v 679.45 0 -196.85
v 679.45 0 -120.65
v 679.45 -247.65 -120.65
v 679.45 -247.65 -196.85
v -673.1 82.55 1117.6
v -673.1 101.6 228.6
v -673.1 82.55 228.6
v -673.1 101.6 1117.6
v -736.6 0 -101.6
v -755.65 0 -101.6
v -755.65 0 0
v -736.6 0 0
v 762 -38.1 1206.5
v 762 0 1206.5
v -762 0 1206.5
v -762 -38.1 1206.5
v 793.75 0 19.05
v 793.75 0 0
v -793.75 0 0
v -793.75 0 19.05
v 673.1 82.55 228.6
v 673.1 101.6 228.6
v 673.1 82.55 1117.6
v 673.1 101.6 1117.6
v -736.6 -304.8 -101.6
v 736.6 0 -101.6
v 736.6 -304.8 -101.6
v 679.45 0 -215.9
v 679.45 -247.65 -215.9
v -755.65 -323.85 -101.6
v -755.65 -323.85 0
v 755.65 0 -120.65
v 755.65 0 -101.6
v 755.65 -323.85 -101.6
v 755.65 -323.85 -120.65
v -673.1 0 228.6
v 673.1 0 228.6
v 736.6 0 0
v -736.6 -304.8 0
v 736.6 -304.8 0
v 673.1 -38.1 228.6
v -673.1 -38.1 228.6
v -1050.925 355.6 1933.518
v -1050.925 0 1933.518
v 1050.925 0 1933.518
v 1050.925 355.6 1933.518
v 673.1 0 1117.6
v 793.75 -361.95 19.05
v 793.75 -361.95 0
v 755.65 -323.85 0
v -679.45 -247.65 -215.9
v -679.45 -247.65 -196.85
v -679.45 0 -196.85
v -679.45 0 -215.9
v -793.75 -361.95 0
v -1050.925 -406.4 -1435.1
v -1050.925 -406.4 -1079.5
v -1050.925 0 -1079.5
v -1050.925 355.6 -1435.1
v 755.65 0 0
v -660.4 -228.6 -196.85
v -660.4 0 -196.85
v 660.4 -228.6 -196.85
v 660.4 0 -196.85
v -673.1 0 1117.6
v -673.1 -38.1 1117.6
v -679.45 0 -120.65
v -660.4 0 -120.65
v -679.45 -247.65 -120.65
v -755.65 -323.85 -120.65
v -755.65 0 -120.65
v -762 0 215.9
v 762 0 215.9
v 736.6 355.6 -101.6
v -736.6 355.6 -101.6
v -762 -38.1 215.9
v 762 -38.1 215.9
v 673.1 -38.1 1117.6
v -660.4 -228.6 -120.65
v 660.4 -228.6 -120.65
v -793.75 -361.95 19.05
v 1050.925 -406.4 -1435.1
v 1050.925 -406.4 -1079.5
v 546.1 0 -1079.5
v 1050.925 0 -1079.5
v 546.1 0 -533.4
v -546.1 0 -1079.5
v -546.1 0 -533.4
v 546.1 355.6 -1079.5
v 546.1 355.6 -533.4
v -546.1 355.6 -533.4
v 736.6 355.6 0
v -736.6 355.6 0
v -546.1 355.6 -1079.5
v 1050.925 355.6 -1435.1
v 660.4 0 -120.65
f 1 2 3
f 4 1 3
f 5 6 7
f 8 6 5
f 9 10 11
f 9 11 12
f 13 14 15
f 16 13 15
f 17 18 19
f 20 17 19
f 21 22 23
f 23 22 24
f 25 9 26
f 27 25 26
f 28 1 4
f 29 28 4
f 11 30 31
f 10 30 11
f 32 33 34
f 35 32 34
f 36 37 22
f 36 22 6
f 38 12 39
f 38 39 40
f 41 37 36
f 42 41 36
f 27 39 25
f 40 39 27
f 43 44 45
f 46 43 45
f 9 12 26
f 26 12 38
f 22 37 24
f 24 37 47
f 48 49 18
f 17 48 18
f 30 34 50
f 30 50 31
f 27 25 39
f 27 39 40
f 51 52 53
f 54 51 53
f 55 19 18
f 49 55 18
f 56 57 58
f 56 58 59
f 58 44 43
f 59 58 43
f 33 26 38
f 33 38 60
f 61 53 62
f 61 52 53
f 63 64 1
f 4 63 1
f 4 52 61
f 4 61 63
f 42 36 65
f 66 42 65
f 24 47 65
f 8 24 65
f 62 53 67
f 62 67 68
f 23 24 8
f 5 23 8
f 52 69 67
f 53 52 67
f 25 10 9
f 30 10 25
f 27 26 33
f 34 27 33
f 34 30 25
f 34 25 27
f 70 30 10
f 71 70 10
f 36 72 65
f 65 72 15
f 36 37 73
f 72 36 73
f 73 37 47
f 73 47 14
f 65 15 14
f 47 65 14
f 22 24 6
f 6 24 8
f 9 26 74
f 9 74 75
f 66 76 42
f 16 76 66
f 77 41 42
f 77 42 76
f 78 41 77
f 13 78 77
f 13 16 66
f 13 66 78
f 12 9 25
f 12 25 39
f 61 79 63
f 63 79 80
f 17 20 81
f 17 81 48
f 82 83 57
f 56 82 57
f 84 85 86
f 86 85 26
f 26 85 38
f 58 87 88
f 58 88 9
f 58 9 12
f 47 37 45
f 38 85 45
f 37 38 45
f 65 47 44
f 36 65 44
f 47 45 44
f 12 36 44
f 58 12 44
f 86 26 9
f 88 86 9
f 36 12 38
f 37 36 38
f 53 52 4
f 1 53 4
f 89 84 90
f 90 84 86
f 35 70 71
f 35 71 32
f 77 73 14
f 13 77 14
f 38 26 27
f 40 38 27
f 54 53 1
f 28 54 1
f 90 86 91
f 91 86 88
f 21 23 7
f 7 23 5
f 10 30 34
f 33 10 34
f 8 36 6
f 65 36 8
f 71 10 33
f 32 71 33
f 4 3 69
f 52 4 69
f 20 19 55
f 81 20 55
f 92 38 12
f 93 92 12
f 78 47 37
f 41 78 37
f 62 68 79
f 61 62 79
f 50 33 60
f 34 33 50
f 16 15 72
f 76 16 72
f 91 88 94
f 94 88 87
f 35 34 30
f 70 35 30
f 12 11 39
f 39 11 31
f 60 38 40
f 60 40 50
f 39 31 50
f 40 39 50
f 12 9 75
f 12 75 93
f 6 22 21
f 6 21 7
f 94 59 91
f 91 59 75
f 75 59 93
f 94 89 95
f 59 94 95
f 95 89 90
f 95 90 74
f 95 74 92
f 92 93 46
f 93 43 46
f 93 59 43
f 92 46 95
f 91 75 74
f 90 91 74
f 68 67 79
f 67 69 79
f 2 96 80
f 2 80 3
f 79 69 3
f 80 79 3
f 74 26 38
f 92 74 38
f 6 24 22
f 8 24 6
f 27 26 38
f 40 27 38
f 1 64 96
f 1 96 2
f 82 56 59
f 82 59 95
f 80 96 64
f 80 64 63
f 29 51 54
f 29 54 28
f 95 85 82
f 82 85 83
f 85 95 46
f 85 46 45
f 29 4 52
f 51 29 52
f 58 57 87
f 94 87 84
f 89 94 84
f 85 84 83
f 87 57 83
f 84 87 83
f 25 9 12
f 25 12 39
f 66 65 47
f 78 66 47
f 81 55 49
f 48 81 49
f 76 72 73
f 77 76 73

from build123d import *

# Parameters (mm, degrees)
F0_W      = 1473.2
F0_H      = 101.6
F1_DEPTH  = 304.8
F2_W      = 19.05
F2_H      = 304.8
F3_DEPTH  = 101.6
F4_W      = 1473.2
F4_H      = 304.8
F5_DEPTH  = 19.05
F6_W      = 1473.2
F6_H      = 304.8
F7_DEPTH  = 19.05
F8_W      = 19.05
F8_H      = 228.6
F9_DEPTH  = 76.2
F10_W     = 1320.8
F10_H     = 228.6
F11_DEPTH = 19.05
F12_W     = 1473.2
F12_H     = 101.6
F12_W_2   = 1346.2
F12_H_2   = 889
F13_DEPTH = 355.6
F14_DEPTH = 101.6
F15_W     = 504.825
F15_H     = 355.6
F16_DEPTH = 355.6
F18_DEPTH = 127
F20_DEPTH = 1468.6634540558
F22_DEPTH = 38.1
F23_DEPTH = 19.05


with BuildPart() as f1:
    # F0 (on Front) → F1 (new body)
    with BuildSketch(Plane.XZ):
        with Locations((0, -50.8)):
            Rectangle(F0_W, F0_H)
    extrude(amount=F1_DEPTH)


with BuildPart() as f3:
    # F2 (on face) → F3 (new body, through all)
    with BuildSketch(Plane(origin=(0, 0, -101.6), x_dir=(1, 0, 0), z_dir=(0, 0, -1))):
        Polygon((755.65, 323.85), (-755.65, 323.85), (-755.65, 304.8), (-736.6, 304.8), (736.6, 304.8), (755.65, 304.8), align=None)
        with Locations((-746.125, 152.4)):
            Rectangle(F2_W, F2_H)
        with Locations((746.125, 152.4)):
            Rectangle(F2_W, F2_H)
    extrude(amount=-F3_DEPTH)


with BuildPart() as f5:
    # F4 (on face) → F5 (new body)
    with BuildSketch(Plane(origin=(0, 0, -101.6), x_dir=(1, 0, 0), z_dir=(0, 0, -1))):
        Polygon((755.65, 323.85), (-755.65, 323.85), (-755.65, 0), (-736.6, 0), (-736.6, 304.8), (736.6, 304.8), (736.6, 0), (755.65, 0), align=None)
        with Locations((0, 152.4)):
            Rectangle(F4_W, F4_H)
    extrude(amount=F5_DEPTH)


with BuildPart() as f7:
    # F6 (on face) → F7 (new body)
    with BuildSketch(Plane.XY):
        with Locations((0, -152.4)):
            Rectangle(F6_W, F6_H)
        Polygon((-736.6, 0), (-755.65, 0), (-793.75, 0), (-793.75, -361.95), (793.75, -361.95), (793.75, 0), (755.65, 0), (736.6, 0), (736.6, -304.8), (-736.6, -304.8), align=None)
    extrude(amount=F7_DEPTH)


with BuildPart() as f9:
    # F8 (on face) → F9 (new body)
    with BuildSketch(Plane(origin=(0, 0, -120.65), x_dir=(1, 0, 0), z_dir=(0, 0, -1))):
        with Locations((-669.925, 114.3)):
            Rectangle(F8_W, F8_H)
        Polygon((-679.45, 247.65), (-679.45, 228.6), (-660.4, 228.6), (660.4, 228.6), (679.45, 228.6), (679.45, 247.65), align=None)
        with Locations((669.925, 114.3)):
            Rectangle(F8_W, F8_H)
    extrude(amount=F9_DEPTH)


with BuildPart() as f11:
    # F10 (on face) → F11 (new body)
    with BuildSketch(Plane(origin=(0, 0, -196.85), x_dir=(1, 0, 0), z_dir=(0, 0, -1))):
        Polygon((679.45, 0), (679.45, 247.65), (-679.45, 247.65), (-679.45, 0), (-660.4, 0), (-660.4, 228.6), (660.4, 228.6), (660.4, 0), align=None)
        with Locations((0, 114.3)):
            Rectangle(F10_W, F10_H)
    extrude(amount=F11_DEPTH)


with BuildPart() as f13:
    # F12 (on face) → F13 (new body)
    with BuildSketch(Plane(origin=(0, 0, 0), x_dir=(-1, 0, 0), z_dir=(0, 1, 0))):
        Polygon((-1050.925, 1117.6), (-1050.925, -1079.5), (-546.1, -1079.5), (-546.1, -533.4), (546.1, -533.4), (546.1, -1079.5), (1050.925, -1079.5), (1050.925, 1117.6), (1050.925, 1933.5181713104), (-1050.925, 1933.5181713104), align=None)
        with Locations((0, -50.8)):
            Rectangle(F12_W, F12_H, mode=Mode.SUBTRACT)
        with Locations((0, 673.1)):
            Rectangle(F12_W_2, F12_H_2, mode=Mode.SUBTRACT)
        with Locations((0, 673.1)):
            Rectangle(F12_W_2, F12_H_2)
    extrude(amount=F13_DEPTH)

    # F12 (on face) → F14 (cut)
    with BuildSketch(Plane(origin=(0, 0, 0), x_dir=(-1, 0, 0), z_dir=(0, 1, 0))):
        with Locations((0, 673.1)):
            Rectangle(F12_W_2, F12_H_2)
    extrude(amount=F14_DEPTH, mode=Mode.SUBTRACT)

    # F15 (on face) → F16 (join)
    with BuildSketch(Plane(origin=(0, 0, -1079.5), x_dir=(1, 0, 0), z_dir=(0, 0, -1))):
        Polygon((-546.1, 0), (-546.1, -355.6), (1050.925, -355.6), (1050.925, 406.4), (-1050.925, 406.4), (-1050.925, 0), align=None)
        with Locations((-798.5125, -177.8)):
            Rectangle(F15_W, F15_H)
    extrude(amount=F16_DEPTH)


with BuildPart() as f18:
    # F17 (on face) → F18 (new body)
    with BuildSketch(Plane.XZ):
        Polygon((476.25, -215.9), (400.05, -215.9), (438.15, -444.5), (476.25, -444.5), align=None)
        Polygon((552.45, -215.9), (476.25, -215.9), (476.25, -444.5), (514.35, -444.5), align=None)
    extrude(amount=F18_DEPTH)


with BuildPart() as f18b:
    # F17 (on face) → F18, piece 2 (new body)
    with BuildSketch(Plane.XZ):
        Polygon((-400.05, -215.9), (-476.25, -215.9), (-476.25, -444.5), (-438.15, -444.5), align=None)
        Polygon((-476.25, -215.9), (-552.45, -215.9), (-514.35, -444.5), (-476.25, -444.5), align=None)
    extrude(amount=F18_DEPTH)


with BuildPart() as f20_tool:
    # F19 (on face) → F20 (new body)
    with BuildSketch(Plane(origin=(-679.45, 0, 0), x_dir=(0, -1, 0), z_dir=(-1, 0, 0))):
        Polygon((127, -444.5), (127, -215.9), (50.8, -444.5), align=None)
    extrude(amount=-F20_DEPTH)


with BuildPart() as f18_1:
    add(f18.part)

    # F20: cut by f20_tool
    add(f20_tool.part, mode=Mode.SUBTRACT)


with BuildPart() as f18b_1:
    add(f18b.part)

    # F20: cut by f20_tool
    add(f20_tool.part, mode=Mode.SUBTRACT)


with BuildPart() as f22:
    # F21 (on face) → F22 (new body)
    with BuildSketch(Plane.XZ):
        Polygon((762, 1206.5), (-762, 1206.5), (-762, 215.9), (762, 215.9), (762, 1117.6), align=None)
        Polygon((-673.1, 228.6), (-673.1, 304.8), (-673.1, 1117.6), (673.1, 1117.6), (673.1, 304.8), (673.1, 228.6), align=None, mode=Mode.SUBTRACT)
    extrude(amount=F22_DEPTH)


with BuildPart() as f23:
    # F23 (new): a face of the model
    f23_faces = [f13.part.faces().sort_by_distance(p)[0] for p in [
        (0, 101.6, 673.1),
    ]]
    extrude(f23_faces, amount=F23_DEPTH)


solid = Compound([f1.part, f3.part, f5.part, f7.part, f9.part, f11.part, f13.part, f22.part, f23.part])
